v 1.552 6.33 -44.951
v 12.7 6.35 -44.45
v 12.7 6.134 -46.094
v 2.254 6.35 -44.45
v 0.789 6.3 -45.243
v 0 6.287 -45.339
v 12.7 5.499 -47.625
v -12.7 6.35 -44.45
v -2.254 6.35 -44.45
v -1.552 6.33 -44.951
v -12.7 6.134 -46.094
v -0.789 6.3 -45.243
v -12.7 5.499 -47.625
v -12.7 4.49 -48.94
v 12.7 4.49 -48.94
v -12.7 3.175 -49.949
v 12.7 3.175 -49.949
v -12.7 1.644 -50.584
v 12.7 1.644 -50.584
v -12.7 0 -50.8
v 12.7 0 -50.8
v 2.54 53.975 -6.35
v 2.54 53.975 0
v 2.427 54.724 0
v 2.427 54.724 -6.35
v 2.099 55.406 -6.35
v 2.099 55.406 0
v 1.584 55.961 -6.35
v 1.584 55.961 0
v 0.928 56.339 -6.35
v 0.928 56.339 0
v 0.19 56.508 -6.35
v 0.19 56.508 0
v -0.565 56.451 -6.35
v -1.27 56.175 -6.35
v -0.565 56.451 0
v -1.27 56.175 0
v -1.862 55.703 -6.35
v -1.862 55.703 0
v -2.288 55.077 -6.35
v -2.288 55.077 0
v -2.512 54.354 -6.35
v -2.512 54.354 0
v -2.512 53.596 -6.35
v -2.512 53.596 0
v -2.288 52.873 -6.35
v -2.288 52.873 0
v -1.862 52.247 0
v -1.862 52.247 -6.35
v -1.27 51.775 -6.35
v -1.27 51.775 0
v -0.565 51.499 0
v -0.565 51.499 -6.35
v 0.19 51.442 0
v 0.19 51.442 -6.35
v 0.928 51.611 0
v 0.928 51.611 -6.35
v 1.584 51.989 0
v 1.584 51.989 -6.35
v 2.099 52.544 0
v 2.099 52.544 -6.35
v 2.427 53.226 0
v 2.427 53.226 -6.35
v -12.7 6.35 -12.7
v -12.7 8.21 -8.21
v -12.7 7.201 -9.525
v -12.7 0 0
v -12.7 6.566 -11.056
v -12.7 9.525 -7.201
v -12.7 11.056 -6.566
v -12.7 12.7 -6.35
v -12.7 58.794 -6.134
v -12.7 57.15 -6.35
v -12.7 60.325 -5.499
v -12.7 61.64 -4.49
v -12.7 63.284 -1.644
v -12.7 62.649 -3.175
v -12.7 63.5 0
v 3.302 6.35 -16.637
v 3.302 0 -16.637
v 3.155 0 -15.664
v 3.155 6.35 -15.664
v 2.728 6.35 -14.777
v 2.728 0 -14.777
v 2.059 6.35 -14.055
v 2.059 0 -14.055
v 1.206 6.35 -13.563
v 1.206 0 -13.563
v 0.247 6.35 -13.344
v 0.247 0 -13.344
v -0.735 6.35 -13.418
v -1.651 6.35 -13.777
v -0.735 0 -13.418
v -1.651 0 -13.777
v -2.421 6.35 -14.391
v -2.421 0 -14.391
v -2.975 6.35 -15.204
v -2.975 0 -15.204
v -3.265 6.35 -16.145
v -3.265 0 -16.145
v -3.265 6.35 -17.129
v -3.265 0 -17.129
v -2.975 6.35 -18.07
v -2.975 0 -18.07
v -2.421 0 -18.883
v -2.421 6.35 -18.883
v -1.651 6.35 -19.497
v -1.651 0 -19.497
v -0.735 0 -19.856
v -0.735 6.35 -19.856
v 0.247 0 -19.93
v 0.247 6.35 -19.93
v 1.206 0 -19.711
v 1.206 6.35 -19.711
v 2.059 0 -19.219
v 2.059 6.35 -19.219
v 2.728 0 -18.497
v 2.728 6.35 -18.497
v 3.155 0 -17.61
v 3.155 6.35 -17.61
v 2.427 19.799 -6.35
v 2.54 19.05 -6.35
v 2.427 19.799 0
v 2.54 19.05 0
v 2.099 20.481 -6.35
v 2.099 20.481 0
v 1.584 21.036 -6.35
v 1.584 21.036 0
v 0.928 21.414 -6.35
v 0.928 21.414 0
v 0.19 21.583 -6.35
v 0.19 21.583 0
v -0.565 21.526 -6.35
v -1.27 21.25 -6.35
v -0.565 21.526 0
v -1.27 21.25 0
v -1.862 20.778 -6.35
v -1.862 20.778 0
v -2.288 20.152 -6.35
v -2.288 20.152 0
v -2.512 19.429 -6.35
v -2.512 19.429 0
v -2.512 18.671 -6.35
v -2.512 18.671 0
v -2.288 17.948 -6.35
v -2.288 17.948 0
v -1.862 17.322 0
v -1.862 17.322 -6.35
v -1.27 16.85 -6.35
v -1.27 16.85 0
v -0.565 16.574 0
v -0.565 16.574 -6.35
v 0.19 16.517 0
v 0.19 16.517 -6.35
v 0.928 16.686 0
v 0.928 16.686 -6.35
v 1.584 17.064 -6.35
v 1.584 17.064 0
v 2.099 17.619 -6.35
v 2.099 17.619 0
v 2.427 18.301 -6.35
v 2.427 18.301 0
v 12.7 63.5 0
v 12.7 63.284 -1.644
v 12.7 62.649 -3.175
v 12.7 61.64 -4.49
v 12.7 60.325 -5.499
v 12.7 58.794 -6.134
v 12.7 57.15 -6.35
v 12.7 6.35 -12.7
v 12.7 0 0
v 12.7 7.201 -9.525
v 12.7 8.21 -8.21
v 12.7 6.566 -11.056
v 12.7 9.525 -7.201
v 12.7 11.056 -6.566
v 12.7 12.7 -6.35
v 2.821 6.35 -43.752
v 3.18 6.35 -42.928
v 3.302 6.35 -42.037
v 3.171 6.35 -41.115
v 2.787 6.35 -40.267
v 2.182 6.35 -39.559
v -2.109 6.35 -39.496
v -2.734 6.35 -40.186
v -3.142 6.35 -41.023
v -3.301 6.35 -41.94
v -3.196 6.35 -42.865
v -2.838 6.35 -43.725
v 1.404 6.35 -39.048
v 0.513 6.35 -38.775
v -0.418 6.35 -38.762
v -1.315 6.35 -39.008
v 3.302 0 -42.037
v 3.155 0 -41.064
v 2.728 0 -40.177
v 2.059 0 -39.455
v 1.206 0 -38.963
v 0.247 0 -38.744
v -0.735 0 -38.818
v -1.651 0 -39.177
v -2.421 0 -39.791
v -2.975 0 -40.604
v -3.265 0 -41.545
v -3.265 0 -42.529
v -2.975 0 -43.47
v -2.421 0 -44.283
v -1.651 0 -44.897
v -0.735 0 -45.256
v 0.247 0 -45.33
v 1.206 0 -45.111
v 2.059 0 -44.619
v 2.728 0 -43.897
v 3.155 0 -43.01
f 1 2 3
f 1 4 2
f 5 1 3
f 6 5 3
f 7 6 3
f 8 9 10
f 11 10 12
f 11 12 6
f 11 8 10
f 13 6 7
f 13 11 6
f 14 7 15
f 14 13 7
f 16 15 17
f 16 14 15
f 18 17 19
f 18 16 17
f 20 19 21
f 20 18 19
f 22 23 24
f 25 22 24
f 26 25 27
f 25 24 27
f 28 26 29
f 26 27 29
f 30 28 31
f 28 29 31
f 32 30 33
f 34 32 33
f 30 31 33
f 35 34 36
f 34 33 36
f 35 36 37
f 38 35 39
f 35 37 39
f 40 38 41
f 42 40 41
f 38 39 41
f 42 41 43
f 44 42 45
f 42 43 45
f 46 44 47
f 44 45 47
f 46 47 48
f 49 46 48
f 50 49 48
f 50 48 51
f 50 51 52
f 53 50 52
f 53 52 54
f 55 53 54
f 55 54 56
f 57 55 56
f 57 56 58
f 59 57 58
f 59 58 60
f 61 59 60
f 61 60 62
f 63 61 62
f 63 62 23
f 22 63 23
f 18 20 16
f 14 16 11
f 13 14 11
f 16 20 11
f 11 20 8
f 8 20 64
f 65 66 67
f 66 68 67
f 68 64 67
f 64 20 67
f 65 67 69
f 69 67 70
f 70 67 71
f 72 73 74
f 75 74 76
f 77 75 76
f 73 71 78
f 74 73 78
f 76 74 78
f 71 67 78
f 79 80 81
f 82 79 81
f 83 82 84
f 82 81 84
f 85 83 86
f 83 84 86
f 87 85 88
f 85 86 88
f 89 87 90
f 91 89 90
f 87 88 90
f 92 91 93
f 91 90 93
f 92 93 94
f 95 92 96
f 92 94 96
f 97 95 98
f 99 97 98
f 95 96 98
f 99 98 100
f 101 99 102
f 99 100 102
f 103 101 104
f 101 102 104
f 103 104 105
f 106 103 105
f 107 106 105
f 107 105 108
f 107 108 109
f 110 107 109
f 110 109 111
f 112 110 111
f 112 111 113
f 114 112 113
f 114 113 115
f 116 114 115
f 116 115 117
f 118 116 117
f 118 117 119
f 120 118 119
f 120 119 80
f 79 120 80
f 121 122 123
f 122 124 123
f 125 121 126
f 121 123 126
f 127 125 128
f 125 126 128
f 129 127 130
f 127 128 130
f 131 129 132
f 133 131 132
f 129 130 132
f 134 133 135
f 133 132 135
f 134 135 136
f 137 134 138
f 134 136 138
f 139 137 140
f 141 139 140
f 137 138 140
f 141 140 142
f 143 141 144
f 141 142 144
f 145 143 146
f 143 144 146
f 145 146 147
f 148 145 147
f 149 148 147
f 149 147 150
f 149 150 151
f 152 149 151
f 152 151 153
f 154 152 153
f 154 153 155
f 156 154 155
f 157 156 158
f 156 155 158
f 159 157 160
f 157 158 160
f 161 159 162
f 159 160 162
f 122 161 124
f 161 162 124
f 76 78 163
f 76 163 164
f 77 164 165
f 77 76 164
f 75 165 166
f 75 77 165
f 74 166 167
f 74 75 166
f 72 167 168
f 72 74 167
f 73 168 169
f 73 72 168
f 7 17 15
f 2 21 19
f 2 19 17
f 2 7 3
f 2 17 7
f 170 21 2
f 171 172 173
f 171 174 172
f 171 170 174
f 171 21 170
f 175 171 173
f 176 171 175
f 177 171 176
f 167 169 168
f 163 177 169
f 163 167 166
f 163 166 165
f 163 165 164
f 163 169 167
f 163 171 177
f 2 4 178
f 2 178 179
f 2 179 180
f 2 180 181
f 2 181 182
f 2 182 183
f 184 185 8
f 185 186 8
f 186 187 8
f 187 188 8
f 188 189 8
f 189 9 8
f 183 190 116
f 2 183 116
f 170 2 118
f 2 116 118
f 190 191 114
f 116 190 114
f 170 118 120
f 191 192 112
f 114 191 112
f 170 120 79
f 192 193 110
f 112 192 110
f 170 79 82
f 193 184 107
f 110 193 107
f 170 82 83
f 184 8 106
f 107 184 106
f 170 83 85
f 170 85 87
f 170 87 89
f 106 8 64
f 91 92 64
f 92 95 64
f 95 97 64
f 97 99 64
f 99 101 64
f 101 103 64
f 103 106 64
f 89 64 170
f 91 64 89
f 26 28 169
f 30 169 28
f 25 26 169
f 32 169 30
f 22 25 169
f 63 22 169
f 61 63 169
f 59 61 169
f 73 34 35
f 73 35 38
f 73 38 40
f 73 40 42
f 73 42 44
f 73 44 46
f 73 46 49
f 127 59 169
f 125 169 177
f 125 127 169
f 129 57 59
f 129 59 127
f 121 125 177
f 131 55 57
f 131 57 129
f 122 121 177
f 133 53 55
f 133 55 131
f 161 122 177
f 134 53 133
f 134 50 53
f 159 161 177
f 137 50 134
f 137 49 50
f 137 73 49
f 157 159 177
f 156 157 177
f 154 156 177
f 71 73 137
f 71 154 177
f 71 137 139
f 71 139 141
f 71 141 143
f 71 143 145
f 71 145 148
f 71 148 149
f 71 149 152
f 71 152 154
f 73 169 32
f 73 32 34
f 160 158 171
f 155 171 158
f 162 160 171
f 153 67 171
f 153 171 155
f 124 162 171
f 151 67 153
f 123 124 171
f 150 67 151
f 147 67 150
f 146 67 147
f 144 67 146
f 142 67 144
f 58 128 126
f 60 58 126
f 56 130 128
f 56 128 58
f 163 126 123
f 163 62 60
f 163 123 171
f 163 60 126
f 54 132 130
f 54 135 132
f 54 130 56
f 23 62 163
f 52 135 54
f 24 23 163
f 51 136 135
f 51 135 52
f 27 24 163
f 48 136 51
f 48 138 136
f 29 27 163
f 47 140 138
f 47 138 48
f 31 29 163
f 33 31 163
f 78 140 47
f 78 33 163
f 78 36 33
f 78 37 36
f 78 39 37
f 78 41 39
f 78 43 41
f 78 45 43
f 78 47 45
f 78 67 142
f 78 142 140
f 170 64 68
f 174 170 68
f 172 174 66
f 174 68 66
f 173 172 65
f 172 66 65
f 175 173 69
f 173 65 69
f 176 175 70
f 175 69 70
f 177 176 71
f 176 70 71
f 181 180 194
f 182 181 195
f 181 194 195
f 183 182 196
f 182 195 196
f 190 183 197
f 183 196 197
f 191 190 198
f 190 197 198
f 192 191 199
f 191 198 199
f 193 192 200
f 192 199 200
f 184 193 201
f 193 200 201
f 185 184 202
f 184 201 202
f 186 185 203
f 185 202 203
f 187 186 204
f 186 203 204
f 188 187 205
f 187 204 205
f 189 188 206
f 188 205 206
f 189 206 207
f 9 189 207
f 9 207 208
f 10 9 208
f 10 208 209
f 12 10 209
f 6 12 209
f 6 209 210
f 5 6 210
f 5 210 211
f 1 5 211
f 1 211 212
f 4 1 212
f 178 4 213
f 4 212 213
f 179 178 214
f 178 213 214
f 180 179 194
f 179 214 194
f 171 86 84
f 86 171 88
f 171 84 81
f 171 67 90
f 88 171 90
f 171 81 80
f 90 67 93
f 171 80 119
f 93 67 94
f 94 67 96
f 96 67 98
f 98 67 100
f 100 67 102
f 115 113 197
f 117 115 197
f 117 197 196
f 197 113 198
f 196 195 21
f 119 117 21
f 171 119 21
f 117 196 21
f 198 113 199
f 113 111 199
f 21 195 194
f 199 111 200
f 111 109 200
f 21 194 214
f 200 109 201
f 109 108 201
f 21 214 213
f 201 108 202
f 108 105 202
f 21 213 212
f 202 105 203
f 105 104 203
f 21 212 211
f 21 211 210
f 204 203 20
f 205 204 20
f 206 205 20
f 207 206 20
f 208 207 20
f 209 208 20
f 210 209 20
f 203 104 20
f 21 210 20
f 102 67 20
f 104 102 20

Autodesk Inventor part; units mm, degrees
ref_plane "YZ Plane" through (0, 0, 0) normal (1, 0, 0) x (0, 1, 0)
ref_plane "XZ Plane" through (0, 0, 0) normal (0, 1, 0) x (-1, 0, 0)
ref_plane "XY Plane" through (0, 0, 0) normal (0, 0, 1) x (1, 0, 0)
sketch "Sketch1" plane through (0, 0, 0) normal (1, 0, 0) x (0, 1, 0)
  line L0 (0, 0) -> (63.5, 0)
  line L1 (0, 0) -> (0, -50.8)
  arc A0 (0, -50.8) -> (6.35, -44.45) centre (0, -44.45) ccw
  arc A1 (57.15, -6.35) -> (63.5, 0) centre (57.15, 0) ccw
  line L2 (57.15, -6.35) -> (12.7, -6.35)
  line L3 (6.35, -44.45) -> (6.35, -12.7)
  arc A2 (12.7, -6.35) -> (6.35, -12.7) centre (12.7, -12.7) ccw
  dimension "d0" = 6.35
  dimension "d1" = 63.5
  dimension "d16" = 50.8
extrude "Extrusion1" add sketch "Sketch1" along normal mid plane 25.4
sketch "Sketch2" plane through (-12.7, 0, 0) normal (0, 0, 1) x (1, 0, 0)
  line L0 (25.4, 6.35) -> (0, 6.35) projected
  line L1 (25.4, 6.35) -> (0, 6.35) projected
  line L2 (25.4, 6.35) -> (0, 6.35) construction
  line L3 (12.7, 6.35) -> (12.7, 63.5) construction
  line L4 (25.4, 63.5) -> (0, 63.5) construction
  circle A0 centre (12.7, 19.05) radius 2.54
  circle A1 centre (12.7, 53.975) radius 2.54
  point P0 (12.7, 0)
  dimension "d4" = 5.08
  dimension "d5" = 12.7
  dimension "d6" = 9.525
extrude "Extrusion2" cut sketch "Sketch2" against normal through all
sketch "Sketch3" plane through (-12.7, 0, -50.8) normal (0, -1, 0) x (1, 0, 0)
  line L0 (25.4, 44.45) -> (0, 44.45) projected
  line L1 (25.4, 0) -> (0, 0) construction
  line L2 (12.7, 0) -> (12.7, 44.45) construction
  circle A0 centre (12.7, 34.163) radius 3.302
  circle A1 centre (12.7, 8.763) radius 3.302
  point P0 (12.7, 50.8)
  dimension "d9" = 6.604
  dimension "d14" = 16.637
  dimension "d15" = 25.4
extrude "Extrusion3" cut sketch "Sketch3" against normal through all
properties part number "support L" material "Aluminum 6061"
